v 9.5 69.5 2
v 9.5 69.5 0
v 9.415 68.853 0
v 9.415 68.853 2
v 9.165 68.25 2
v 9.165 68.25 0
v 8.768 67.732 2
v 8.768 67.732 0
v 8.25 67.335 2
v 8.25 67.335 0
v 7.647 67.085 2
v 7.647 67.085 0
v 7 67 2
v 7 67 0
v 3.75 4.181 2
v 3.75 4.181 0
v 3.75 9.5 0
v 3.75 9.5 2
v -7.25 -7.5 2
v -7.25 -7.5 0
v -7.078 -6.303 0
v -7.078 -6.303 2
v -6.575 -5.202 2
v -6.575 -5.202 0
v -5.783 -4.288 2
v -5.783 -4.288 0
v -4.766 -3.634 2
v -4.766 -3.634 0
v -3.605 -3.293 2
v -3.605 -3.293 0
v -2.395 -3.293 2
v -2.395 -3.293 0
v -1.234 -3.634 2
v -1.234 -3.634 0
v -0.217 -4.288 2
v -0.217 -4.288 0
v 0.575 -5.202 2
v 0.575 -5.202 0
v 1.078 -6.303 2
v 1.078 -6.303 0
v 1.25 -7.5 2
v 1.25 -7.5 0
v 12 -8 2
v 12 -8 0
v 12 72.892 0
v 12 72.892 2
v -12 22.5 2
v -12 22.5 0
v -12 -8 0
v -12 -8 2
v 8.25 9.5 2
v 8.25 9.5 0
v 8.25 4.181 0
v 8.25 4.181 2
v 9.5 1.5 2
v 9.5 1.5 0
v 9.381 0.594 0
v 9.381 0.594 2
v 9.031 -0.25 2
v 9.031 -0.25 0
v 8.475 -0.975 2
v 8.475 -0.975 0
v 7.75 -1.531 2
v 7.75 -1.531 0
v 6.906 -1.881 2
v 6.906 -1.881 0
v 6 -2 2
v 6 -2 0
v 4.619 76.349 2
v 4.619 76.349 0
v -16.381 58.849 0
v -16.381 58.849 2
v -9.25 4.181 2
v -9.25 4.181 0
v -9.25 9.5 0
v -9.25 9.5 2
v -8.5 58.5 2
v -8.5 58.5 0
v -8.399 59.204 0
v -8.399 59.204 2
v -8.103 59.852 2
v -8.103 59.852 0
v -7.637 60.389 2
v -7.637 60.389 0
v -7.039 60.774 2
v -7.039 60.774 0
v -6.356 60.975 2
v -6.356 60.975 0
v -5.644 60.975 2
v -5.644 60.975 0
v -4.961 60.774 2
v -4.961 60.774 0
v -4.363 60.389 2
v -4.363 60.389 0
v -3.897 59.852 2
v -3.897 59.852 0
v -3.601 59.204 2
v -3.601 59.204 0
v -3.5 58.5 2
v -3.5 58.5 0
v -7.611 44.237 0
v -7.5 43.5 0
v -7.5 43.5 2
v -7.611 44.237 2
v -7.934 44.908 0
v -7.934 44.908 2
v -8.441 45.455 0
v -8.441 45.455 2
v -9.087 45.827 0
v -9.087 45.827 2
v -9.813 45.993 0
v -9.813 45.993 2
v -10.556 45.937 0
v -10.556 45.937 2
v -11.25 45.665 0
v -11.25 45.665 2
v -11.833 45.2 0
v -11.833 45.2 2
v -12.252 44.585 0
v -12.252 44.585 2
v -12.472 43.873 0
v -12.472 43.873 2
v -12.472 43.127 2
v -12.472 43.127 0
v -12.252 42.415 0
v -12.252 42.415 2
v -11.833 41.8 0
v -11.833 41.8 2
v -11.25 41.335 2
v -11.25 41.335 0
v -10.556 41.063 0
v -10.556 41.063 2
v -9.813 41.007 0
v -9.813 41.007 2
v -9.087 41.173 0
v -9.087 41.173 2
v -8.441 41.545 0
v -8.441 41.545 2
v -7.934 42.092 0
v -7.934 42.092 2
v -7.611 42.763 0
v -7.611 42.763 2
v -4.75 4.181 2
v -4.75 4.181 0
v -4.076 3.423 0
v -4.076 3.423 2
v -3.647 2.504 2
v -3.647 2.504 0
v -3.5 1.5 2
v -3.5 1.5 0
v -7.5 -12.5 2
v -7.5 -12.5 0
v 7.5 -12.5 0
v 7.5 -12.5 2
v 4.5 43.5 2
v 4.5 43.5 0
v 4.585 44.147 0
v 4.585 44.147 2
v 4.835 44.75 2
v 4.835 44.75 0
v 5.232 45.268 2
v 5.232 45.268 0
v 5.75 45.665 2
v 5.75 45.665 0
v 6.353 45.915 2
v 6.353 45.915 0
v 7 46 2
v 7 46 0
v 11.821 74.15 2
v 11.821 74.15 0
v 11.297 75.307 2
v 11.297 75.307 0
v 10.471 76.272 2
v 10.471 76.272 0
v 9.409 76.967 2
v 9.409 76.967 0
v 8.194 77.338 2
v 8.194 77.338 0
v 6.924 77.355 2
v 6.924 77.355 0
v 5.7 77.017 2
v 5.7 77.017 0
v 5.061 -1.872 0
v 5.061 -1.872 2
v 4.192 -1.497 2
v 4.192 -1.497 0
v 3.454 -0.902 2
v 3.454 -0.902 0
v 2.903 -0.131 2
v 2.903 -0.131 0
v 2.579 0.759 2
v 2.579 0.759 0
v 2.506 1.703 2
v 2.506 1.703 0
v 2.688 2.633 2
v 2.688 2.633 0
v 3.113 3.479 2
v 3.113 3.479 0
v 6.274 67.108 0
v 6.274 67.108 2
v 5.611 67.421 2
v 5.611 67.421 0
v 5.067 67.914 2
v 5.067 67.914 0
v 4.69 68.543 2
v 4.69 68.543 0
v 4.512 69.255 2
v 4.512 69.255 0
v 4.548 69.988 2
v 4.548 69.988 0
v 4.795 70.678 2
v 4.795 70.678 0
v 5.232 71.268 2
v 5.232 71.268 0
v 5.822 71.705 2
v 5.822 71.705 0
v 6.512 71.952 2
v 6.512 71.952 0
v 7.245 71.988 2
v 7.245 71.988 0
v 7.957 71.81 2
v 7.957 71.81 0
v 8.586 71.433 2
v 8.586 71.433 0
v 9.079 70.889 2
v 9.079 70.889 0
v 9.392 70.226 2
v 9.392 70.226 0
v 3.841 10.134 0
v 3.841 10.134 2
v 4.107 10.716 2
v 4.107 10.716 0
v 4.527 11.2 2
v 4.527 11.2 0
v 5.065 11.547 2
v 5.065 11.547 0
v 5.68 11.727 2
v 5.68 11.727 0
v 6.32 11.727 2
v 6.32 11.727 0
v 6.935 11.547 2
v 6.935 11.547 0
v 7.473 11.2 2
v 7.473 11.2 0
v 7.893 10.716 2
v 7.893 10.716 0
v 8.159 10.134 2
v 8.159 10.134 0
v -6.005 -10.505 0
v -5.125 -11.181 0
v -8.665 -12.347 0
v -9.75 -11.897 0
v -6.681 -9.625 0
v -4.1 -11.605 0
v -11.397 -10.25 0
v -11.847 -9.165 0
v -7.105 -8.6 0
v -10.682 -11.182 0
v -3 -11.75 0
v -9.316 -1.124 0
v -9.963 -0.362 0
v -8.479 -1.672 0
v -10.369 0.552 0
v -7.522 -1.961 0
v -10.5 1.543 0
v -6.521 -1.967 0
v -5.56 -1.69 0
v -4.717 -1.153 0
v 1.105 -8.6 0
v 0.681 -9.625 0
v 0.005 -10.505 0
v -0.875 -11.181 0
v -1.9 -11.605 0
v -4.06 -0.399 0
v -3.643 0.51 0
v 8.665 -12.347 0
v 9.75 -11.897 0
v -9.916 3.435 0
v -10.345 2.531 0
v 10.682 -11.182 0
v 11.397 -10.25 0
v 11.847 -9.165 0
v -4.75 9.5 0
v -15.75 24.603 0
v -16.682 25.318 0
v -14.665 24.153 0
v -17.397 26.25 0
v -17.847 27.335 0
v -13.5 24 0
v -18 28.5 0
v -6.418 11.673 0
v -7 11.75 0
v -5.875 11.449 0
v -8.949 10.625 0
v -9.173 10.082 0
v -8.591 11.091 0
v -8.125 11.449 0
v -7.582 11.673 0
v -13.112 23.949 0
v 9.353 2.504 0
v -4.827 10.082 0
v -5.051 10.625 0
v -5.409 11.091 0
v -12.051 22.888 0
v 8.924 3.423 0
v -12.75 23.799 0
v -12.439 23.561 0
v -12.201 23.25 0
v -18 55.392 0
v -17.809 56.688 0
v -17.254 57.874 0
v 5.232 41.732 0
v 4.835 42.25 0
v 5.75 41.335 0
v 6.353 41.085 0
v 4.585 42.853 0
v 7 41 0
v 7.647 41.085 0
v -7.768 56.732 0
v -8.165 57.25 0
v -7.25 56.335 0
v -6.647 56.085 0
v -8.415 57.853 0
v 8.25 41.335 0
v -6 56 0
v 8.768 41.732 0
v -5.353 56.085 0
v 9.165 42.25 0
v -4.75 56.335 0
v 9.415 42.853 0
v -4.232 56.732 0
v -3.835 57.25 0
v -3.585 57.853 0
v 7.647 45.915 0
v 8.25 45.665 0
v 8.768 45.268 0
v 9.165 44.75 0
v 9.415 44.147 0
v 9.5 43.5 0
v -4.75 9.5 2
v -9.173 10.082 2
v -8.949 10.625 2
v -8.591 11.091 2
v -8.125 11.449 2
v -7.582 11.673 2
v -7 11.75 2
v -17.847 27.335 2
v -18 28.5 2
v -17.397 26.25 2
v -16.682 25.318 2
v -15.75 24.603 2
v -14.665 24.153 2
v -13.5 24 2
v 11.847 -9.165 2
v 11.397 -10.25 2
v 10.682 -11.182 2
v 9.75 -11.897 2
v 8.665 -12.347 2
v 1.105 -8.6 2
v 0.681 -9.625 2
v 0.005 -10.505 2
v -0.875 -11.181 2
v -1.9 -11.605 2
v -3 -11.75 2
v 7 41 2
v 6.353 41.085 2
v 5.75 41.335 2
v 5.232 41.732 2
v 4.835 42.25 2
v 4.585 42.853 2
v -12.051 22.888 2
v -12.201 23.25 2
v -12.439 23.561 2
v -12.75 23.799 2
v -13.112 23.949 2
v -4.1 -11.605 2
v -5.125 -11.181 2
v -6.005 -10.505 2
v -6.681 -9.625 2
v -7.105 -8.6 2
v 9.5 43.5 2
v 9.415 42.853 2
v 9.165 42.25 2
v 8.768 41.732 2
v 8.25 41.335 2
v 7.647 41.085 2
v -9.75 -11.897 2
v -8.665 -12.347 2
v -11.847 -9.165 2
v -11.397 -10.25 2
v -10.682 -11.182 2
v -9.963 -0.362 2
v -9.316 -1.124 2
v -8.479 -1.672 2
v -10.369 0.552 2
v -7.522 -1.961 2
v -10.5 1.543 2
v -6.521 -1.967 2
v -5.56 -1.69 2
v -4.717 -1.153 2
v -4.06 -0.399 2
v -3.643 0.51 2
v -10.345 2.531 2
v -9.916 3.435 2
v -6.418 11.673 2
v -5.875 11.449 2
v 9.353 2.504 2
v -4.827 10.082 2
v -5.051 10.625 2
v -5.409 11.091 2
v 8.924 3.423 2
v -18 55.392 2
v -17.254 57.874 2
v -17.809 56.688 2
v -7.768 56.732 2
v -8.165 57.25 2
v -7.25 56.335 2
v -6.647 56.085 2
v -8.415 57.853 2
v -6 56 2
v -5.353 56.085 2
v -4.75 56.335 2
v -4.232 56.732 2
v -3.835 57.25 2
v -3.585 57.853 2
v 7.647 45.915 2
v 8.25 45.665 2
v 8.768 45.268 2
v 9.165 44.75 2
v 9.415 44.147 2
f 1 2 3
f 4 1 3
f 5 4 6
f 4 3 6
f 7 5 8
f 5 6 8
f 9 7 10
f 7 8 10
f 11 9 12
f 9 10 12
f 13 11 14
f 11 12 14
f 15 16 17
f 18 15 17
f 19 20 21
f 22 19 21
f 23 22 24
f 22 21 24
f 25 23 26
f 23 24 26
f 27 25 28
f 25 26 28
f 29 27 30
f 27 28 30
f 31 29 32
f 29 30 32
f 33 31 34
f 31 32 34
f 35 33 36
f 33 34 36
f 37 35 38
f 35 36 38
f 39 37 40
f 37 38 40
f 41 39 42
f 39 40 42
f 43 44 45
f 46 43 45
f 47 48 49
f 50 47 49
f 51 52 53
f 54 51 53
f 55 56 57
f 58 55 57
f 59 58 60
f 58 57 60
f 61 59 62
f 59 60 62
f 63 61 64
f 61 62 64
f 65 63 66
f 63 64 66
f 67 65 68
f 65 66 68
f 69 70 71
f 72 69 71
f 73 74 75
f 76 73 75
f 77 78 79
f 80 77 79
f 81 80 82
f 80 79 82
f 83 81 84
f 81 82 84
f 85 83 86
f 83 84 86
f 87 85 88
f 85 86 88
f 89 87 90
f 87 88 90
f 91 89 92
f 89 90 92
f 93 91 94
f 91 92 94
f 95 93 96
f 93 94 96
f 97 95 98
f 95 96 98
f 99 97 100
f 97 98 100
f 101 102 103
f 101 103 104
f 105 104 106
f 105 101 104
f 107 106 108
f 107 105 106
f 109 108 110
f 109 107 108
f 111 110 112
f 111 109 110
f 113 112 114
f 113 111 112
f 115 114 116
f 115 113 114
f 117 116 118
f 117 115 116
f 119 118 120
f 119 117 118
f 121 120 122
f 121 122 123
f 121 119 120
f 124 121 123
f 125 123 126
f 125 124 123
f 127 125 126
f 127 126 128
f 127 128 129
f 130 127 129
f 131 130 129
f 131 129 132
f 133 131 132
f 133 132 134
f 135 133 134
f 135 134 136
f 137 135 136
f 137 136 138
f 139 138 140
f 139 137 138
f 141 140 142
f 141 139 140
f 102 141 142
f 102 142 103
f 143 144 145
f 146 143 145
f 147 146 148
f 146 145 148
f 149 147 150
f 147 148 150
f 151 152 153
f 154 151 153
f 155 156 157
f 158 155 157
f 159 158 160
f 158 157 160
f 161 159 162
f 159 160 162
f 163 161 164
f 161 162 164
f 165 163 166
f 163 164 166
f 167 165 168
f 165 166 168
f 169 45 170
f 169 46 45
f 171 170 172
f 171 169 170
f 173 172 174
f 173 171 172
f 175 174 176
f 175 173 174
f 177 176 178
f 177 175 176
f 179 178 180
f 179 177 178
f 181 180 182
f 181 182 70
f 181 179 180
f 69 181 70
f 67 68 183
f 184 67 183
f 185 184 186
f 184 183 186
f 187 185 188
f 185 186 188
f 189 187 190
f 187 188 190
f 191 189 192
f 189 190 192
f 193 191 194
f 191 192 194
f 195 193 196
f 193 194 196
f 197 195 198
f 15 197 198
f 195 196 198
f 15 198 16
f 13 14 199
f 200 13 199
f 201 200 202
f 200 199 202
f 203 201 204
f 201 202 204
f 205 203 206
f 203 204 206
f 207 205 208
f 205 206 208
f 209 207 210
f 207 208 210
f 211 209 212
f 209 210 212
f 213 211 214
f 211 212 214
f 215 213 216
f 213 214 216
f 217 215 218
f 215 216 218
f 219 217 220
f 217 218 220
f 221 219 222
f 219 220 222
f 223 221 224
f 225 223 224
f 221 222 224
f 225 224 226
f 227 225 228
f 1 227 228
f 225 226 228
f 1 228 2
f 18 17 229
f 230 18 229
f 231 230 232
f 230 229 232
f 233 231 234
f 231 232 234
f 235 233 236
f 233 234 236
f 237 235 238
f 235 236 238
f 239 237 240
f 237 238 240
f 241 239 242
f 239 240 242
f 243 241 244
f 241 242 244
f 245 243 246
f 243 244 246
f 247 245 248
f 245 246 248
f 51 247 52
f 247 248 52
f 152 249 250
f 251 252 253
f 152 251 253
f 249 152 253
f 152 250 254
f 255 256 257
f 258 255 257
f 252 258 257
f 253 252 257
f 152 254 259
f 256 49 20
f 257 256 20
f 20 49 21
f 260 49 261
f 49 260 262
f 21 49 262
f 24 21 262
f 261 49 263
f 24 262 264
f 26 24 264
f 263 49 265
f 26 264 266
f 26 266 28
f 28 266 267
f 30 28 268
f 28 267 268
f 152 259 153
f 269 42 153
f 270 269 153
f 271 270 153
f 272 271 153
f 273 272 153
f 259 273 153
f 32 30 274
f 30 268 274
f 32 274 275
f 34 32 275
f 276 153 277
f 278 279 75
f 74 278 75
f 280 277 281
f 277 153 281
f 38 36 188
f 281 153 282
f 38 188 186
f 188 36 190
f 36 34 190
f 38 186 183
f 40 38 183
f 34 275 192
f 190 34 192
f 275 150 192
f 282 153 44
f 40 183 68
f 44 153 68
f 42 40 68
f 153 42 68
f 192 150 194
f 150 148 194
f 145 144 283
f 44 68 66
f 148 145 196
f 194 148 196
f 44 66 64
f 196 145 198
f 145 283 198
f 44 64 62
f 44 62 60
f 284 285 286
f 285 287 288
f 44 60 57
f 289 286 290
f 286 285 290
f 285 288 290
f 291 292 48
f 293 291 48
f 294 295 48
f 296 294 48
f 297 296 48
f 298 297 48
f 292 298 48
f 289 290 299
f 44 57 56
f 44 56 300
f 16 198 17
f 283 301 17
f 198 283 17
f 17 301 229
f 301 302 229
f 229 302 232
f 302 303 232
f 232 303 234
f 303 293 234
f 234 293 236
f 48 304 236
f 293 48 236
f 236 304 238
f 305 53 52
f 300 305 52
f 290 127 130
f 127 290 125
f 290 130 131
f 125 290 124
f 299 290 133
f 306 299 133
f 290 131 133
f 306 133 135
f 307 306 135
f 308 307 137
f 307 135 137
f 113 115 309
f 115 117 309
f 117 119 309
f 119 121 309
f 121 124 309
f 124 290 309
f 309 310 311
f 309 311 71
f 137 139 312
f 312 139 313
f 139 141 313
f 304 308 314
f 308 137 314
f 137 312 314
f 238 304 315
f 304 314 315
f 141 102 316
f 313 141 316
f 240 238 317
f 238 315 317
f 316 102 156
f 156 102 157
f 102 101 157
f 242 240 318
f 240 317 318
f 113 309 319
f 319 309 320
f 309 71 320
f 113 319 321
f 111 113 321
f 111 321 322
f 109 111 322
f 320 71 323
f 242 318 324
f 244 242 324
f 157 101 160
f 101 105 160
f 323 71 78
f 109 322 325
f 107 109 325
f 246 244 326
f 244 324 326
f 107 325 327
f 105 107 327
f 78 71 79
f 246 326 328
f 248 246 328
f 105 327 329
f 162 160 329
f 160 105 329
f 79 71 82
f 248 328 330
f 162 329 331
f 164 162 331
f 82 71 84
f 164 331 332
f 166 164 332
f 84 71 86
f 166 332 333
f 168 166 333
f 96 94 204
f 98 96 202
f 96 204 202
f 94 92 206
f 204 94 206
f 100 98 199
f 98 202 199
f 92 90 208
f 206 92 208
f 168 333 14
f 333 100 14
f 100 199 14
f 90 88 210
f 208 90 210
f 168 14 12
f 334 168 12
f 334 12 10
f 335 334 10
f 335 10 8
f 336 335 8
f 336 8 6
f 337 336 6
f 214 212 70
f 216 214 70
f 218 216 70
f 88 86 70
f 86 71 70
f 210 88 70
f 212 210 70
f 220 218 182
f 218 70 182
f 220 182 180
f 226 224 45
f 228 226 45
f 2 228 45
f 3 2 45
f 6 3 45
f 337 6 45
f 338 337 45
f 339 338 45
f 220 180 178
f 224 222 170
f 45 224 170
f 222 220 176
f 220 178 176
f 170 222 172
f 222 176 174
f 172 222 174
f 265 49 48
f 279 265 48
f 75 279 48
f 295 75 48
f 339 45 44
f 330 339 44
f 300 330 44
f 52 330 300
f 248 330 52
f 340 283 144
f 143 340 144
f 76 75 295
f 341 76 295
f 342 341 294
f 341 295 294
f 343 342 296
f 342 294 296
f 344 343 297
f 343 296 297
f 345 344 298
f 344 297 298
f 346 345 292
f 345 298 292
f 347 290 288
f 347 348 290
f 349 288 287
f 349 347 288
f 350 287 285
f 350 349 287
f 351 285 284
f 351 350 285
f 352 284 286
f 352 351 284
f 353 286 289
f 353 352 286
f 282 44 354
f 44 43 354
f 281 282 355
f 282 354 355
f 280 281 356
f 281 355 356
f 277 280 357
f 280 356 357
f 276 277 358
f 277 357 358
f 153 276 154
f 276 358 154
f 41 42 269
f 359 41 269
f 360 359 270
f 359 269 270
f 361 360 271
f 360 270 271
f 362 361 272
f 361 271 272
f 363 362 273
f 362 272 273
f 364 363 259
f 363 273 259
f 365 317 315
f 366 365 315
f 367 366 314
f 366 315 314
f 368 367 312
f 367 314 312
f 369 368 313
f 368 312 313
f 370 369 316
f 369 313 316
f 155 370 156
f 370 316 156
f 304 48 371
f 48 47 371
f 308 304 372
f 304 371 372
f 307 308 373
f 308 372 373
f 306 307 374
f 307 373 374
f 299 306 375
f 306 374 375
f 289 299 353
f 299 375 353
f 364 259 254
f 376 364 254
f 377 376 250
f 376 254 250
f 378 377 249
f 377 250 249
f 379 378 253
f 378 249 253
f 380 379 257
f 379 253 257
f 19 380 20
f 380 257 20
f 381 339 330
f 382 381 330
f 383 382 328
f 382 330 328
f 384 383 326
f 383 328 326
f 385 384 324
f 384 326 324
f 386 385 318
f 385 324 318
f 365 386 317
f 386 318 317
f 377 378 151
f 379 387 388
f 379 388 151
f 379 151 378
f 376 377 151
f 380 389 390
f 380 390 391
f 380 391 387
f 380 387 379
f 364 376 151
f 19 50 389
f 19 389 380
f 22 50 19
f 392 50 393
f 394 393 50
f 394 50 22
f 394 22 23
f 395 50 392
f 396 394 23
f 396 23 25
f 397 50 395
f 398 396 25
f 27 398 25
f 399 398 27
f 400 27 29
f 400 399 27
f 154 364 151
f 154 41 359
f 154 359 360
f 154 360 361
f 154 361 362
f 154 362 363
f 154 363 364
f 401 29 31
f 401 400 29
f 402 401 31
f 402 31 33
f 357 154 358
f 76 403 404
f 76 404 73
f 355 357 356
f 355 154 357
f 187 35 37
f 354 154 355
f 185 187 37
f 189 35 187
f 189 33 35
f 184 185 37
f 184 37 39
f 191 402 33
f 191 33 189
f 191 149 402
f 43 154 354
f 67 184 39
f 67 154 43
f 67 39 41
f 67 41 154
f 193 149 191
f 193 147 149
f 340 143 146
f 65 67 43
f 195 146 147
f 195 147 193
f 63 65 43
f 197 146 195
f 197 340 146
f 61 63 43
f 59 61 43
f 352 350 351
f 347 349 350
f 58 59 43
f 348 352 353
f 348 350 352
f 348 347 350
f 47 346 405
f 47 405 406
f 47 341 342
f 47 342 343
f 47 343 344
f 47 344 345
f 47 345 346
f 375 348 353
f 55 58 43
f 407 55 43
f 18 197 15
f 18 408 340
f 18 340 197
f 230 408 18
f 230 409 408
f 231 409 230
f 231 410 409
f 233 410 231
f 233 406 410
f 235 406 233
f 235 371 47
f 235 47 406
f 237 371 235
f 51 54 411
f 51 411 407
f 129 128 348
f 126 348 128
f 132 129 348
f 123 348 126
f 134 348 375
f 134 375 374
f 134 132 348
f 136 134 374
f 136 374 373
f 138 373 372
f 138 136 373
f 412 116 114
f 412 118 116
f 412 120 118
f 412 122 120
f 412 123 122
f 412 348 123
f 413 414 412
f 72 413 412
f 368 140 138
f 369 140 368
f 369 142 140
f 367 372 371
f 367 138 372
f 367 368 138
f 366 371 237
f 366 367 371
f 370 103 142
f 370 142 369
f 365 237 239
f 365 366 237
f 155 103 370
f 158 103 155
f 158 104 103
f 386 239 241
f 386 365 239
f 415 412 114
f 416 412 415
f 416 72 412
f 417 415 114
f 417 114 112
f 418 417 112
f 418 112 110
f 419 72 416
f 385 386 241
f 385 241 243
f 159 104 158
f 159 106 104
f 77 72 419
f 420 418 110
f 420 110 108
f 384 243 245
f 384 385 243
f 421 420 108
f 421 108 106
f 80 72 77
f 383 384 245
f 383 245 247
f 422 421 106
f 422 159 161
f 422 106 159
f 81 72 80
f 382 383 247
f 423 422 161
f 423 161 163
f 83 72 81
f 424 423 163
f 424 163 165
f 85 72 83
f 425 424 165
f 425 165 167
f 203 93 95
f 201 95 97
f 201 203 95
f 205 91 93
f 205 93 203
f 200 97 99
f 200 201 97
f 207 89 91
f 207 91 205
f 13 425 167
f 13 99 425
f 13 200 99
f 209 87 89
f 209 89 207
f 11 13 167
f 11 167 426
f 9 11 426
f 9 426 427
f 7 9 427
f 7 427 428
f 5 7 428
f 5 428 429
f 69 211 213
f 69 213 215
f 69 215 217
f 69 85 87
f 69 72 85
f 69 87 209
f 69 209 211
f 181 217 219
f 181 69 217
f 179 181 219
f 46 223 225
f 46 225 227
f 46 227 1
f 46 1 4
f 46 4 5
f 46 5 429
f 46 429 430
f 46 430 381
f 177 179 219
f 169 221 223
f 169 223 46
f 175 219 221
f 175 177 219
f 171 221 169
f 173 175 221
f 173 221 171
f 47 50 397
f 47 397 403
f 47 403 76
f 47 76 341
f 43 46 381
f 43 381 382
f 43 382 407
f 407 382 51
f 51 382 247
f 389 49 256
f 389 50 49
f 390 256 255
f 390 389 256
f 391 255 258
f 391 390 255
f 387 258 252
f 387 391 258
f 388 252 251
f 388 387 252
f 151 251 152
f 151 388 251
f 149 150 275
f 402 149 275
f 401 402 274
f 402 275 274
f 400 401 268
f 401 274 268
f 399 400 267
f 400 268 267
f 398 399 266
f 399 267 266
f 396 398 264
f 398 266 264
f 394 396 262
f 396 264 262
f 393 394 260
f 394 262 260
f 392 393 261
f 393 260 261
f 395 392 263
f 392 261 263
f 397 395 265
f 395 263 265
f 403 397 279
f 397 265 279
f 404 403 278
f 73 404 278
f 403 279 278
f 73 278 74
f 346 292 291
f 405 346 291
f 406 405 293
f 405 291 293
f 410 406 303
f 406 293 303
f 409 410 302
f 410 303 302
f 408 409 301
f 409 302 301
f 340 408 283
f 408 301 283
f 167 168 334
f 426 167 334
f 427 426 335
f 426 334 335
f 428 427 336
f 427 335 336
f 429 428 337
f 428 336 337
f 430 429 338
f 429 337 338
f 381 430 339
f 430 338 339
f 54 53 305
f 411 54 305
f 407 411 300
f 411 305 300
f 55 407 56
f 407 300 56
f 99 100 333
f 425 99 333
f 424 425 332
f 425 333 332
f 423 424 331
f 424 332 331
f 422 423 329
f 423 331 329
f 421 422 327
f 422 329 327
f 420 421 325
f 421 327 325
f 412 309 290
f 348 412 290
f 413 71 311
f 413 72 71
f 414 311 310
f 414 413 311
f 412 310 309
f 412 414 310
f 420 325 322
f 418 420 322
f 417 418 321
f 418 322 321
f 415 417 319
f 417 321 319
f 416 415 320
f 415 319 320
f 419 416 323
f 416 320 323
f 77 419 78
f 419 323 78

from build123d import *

# Parameters (mm, degrees)
F0_R     = 2.5
F1_DEPTH = 2
F2_R     = 4.5
F3_R     = 1.49999


# Not quite as in the source:
# - a fillet or chamfer is up to 0.001 mm smaller than in the source, because OpenCascade refuses the exact size


with BuildPart() as f1:
    # F0 (on Top) → F1 (new body)
    with BuildSketch(Plane.XY):
        with BuildLine():
            Line((6, -12.5), (12, -12.5))
            Line((12, -12.5), (12, 9.5))
            Line((12, 9.5), (8.25, 9.5))
            Line((8.25, 9.5), (8.25, 4.1809513237))
            ThreePointArc((8.25, 4.1809513237), (9.1721443851, 2.9790199458), (9.5, 1.5))
            ThreePointArc((9.5, 1.5), (8.4748737342, -0.9748737342), (6, -2))
            Line((6, -2), (6, -12.5))
        make_face()
        with BuildLine():
            Line((8.25, 9.5), (12, 9.5))
            Line((12, 9.5), (12, 12.5))
            Line((12, 12.5), (-7, 12.5))
            Line((-7, 12.5), (-7, 11.75))
            ThreePointArc((-7, 11.75), (-5.4090097423, 11.0909902577), (-4.75, 9.5))
            Line((-4.75, 9.5), (-4.75, 4.1809513237))
            ThreePointArc((-4.75, 4.1809513237), (-3.8278556149, 2.9790199458), (-3.5, 1.5))
            ThreePointArc((-3.5, 1.5), (-8.4790199458, -1.6721443851), (-9.25, 4.1809513237))
            Line((-9.25, 4.1809513237), (-9.25, 9.5))
            Line((-9.25, 9.5), (-12, 9.5))
            Line((-12, 9.5), (-12, -7.5))
            Line((-12, -7.5), (-7.25, -7.5))
            ThreePointArc((-7.25, -7.5), (-3, -3.25), (1.25, -7.5))
            ThreePointArc((1.25, -7.5), (0.00520382, -10.50520382), (-3, -11.75))
            Line((-3, -11.75), (-3, -12.5))
            Line((-3, -12.5), (6, -12.5))
            Line((6, -12.5), (6, -2))
            ThreePointArc((6, -2), (2.7111301612, 0.3027802276), (3.75, 4.1809513237))
            Line((3.75, 4.1809513237), (3.75, 9.5))
            ThreePointArc((3.75, 9.5), (6, 11.75), (8.25, 9.5))
        make_face()
        Polygon((-7, 12.5), (12, 12.5), (12, 22.5), (7, 22.5), (-6, 22.5), (-12, 22.5), (-12, 12.5), align=None)
        with BuildLine():
            Line((-12, -12.5), (-3, -12.5))
            Line((-3, -12.5), (-3, -11.75))
            ThreePointArc((-3, -11.75), (-6.00520382, -10.50520382), (-7.25, -7.5))
            Line((-7.25, -7.5), (-12, -7.5))
            Line((-12, -7.5), (-12, -12.5))
        make_face()
        with BuildLine():
            Line((-7, 11.75), (-7, 12.5))
            Line((-7, 12.5), (-12, 12.5))
            Line((-12, 12.5), (-12, 9.5))
            Line((-12, 9.5), (-9.25, 9.5))
            ThreePointArc((-9.25, 9.5), (-8.5909902577, 11.0909902577), (-7, 11.75))
        make_face()
        with BuildLine():
            Line((7, 22.5), (12, 22.5))
            Line((12, 22.5), (12, 43.5))
            Line((12, 43.5), (9.5, 43.5))
            ThreePointArc((9.5, 43.5), (8.767766953, 41.732233047), (7, 41))
            Line((7, 41), (7, 22.5))
        make_face()
        with BuildLine():
            Line((-6, 22.5), (7, 22.5))
            Line((7, 22.5), (7, 41))
            ThreePointArc((7, 41), (5.232233047, 41.732233047), (4.5, 43.5))
            Line((4.5, 43.5), (-6, 43.5))
            Line((-6, 43.5), (-6, 22.5))
        make_face()
        with BuildLine():
            Line((9.5, 43.5), (12, 43.5))
            Line((12, 43.5), (12, 72.5))
            Line((12, 72.5), (0, 72.5))
            Line((0, 72.5), (-16.8, 58.5))
            Line((-16.8, 58.5), (-8.5, 58.5))
            ThreePointArc((-8.5, 58.5), (-6, 61), (-3.5, 58.5))
            ThreePointArc((-3.5, 58.5), (-4.232233047, 56.732233047), (-6, 56))
            Line((-6, 56), (-6, 43.5))
            Line((-6, 43.5), (4.5, 43.5))
            ThreePointArc((4.5, 43.5), (5.232233047, 45.267766953), (7, 46))
            ThreePointArc((7, 46), (8.767766953, 45.267766953), (9.5, 43.5))
        make_face()
        with BuildLine():
            ThreePointArc((9.5, 69.5), (8.767766953, 67.732233047), (7, 67))
            ThreePointArc((7, 67), (5.232233047, 71.267766953), (9.5, 69.5))
        make_face(mode=Mode.SUBTRACT)
        with BuildLine():
            Line((-12, 24), (-12, 22.5))
            Line((-12, 22.5), (-6, 22.5))
            Line((-6, 22.5), (-6, 43.5))
            Line((-6, 43.5), (-6, 56))
            ThreePointArc((-6, 56), (-7.767766953, 56.732233047), (-8.5, 58.5))
            Line((-8.5, 58.5), (-16.8, 58.5))
            Line((-16.8, 58.5), (-18, 57.5))
            Line((-18, 57.5), (-18, 24))
            Line((-18, 24), (-12, 24))
        make_face()
        with Locations((-10, 43.5)):
            Circle(F0_R, mode=Mode.SUBTRACT)
        Polygon((0, 72.5), (12, 72.5), (12, 82.5), align=None)
    extrude(amount=F1_DEPTH)

    # F2
    f2_edges = [f1.edges().sort_by_distance(p)[0] for p in [
        (12, 82.5, 1),
        (-18, 57.5, 1),
        (-12, -12.5, 1),
        (12, -12.5, 1),
        (-18, 24, 1),
    ]]
    fillet(f2_edges, radius=F2_R)

    # F3 (radius 1.5 in the source; OpenCascade refuses exactly that, so slightly less here)
    f3_edges = [f1.edges().sort_by_distance(p)[0] for p in [
        (-12, 24, 1),
    ]]
    fillet(f3_edges, radius=F3_R)


solid = f1.part
